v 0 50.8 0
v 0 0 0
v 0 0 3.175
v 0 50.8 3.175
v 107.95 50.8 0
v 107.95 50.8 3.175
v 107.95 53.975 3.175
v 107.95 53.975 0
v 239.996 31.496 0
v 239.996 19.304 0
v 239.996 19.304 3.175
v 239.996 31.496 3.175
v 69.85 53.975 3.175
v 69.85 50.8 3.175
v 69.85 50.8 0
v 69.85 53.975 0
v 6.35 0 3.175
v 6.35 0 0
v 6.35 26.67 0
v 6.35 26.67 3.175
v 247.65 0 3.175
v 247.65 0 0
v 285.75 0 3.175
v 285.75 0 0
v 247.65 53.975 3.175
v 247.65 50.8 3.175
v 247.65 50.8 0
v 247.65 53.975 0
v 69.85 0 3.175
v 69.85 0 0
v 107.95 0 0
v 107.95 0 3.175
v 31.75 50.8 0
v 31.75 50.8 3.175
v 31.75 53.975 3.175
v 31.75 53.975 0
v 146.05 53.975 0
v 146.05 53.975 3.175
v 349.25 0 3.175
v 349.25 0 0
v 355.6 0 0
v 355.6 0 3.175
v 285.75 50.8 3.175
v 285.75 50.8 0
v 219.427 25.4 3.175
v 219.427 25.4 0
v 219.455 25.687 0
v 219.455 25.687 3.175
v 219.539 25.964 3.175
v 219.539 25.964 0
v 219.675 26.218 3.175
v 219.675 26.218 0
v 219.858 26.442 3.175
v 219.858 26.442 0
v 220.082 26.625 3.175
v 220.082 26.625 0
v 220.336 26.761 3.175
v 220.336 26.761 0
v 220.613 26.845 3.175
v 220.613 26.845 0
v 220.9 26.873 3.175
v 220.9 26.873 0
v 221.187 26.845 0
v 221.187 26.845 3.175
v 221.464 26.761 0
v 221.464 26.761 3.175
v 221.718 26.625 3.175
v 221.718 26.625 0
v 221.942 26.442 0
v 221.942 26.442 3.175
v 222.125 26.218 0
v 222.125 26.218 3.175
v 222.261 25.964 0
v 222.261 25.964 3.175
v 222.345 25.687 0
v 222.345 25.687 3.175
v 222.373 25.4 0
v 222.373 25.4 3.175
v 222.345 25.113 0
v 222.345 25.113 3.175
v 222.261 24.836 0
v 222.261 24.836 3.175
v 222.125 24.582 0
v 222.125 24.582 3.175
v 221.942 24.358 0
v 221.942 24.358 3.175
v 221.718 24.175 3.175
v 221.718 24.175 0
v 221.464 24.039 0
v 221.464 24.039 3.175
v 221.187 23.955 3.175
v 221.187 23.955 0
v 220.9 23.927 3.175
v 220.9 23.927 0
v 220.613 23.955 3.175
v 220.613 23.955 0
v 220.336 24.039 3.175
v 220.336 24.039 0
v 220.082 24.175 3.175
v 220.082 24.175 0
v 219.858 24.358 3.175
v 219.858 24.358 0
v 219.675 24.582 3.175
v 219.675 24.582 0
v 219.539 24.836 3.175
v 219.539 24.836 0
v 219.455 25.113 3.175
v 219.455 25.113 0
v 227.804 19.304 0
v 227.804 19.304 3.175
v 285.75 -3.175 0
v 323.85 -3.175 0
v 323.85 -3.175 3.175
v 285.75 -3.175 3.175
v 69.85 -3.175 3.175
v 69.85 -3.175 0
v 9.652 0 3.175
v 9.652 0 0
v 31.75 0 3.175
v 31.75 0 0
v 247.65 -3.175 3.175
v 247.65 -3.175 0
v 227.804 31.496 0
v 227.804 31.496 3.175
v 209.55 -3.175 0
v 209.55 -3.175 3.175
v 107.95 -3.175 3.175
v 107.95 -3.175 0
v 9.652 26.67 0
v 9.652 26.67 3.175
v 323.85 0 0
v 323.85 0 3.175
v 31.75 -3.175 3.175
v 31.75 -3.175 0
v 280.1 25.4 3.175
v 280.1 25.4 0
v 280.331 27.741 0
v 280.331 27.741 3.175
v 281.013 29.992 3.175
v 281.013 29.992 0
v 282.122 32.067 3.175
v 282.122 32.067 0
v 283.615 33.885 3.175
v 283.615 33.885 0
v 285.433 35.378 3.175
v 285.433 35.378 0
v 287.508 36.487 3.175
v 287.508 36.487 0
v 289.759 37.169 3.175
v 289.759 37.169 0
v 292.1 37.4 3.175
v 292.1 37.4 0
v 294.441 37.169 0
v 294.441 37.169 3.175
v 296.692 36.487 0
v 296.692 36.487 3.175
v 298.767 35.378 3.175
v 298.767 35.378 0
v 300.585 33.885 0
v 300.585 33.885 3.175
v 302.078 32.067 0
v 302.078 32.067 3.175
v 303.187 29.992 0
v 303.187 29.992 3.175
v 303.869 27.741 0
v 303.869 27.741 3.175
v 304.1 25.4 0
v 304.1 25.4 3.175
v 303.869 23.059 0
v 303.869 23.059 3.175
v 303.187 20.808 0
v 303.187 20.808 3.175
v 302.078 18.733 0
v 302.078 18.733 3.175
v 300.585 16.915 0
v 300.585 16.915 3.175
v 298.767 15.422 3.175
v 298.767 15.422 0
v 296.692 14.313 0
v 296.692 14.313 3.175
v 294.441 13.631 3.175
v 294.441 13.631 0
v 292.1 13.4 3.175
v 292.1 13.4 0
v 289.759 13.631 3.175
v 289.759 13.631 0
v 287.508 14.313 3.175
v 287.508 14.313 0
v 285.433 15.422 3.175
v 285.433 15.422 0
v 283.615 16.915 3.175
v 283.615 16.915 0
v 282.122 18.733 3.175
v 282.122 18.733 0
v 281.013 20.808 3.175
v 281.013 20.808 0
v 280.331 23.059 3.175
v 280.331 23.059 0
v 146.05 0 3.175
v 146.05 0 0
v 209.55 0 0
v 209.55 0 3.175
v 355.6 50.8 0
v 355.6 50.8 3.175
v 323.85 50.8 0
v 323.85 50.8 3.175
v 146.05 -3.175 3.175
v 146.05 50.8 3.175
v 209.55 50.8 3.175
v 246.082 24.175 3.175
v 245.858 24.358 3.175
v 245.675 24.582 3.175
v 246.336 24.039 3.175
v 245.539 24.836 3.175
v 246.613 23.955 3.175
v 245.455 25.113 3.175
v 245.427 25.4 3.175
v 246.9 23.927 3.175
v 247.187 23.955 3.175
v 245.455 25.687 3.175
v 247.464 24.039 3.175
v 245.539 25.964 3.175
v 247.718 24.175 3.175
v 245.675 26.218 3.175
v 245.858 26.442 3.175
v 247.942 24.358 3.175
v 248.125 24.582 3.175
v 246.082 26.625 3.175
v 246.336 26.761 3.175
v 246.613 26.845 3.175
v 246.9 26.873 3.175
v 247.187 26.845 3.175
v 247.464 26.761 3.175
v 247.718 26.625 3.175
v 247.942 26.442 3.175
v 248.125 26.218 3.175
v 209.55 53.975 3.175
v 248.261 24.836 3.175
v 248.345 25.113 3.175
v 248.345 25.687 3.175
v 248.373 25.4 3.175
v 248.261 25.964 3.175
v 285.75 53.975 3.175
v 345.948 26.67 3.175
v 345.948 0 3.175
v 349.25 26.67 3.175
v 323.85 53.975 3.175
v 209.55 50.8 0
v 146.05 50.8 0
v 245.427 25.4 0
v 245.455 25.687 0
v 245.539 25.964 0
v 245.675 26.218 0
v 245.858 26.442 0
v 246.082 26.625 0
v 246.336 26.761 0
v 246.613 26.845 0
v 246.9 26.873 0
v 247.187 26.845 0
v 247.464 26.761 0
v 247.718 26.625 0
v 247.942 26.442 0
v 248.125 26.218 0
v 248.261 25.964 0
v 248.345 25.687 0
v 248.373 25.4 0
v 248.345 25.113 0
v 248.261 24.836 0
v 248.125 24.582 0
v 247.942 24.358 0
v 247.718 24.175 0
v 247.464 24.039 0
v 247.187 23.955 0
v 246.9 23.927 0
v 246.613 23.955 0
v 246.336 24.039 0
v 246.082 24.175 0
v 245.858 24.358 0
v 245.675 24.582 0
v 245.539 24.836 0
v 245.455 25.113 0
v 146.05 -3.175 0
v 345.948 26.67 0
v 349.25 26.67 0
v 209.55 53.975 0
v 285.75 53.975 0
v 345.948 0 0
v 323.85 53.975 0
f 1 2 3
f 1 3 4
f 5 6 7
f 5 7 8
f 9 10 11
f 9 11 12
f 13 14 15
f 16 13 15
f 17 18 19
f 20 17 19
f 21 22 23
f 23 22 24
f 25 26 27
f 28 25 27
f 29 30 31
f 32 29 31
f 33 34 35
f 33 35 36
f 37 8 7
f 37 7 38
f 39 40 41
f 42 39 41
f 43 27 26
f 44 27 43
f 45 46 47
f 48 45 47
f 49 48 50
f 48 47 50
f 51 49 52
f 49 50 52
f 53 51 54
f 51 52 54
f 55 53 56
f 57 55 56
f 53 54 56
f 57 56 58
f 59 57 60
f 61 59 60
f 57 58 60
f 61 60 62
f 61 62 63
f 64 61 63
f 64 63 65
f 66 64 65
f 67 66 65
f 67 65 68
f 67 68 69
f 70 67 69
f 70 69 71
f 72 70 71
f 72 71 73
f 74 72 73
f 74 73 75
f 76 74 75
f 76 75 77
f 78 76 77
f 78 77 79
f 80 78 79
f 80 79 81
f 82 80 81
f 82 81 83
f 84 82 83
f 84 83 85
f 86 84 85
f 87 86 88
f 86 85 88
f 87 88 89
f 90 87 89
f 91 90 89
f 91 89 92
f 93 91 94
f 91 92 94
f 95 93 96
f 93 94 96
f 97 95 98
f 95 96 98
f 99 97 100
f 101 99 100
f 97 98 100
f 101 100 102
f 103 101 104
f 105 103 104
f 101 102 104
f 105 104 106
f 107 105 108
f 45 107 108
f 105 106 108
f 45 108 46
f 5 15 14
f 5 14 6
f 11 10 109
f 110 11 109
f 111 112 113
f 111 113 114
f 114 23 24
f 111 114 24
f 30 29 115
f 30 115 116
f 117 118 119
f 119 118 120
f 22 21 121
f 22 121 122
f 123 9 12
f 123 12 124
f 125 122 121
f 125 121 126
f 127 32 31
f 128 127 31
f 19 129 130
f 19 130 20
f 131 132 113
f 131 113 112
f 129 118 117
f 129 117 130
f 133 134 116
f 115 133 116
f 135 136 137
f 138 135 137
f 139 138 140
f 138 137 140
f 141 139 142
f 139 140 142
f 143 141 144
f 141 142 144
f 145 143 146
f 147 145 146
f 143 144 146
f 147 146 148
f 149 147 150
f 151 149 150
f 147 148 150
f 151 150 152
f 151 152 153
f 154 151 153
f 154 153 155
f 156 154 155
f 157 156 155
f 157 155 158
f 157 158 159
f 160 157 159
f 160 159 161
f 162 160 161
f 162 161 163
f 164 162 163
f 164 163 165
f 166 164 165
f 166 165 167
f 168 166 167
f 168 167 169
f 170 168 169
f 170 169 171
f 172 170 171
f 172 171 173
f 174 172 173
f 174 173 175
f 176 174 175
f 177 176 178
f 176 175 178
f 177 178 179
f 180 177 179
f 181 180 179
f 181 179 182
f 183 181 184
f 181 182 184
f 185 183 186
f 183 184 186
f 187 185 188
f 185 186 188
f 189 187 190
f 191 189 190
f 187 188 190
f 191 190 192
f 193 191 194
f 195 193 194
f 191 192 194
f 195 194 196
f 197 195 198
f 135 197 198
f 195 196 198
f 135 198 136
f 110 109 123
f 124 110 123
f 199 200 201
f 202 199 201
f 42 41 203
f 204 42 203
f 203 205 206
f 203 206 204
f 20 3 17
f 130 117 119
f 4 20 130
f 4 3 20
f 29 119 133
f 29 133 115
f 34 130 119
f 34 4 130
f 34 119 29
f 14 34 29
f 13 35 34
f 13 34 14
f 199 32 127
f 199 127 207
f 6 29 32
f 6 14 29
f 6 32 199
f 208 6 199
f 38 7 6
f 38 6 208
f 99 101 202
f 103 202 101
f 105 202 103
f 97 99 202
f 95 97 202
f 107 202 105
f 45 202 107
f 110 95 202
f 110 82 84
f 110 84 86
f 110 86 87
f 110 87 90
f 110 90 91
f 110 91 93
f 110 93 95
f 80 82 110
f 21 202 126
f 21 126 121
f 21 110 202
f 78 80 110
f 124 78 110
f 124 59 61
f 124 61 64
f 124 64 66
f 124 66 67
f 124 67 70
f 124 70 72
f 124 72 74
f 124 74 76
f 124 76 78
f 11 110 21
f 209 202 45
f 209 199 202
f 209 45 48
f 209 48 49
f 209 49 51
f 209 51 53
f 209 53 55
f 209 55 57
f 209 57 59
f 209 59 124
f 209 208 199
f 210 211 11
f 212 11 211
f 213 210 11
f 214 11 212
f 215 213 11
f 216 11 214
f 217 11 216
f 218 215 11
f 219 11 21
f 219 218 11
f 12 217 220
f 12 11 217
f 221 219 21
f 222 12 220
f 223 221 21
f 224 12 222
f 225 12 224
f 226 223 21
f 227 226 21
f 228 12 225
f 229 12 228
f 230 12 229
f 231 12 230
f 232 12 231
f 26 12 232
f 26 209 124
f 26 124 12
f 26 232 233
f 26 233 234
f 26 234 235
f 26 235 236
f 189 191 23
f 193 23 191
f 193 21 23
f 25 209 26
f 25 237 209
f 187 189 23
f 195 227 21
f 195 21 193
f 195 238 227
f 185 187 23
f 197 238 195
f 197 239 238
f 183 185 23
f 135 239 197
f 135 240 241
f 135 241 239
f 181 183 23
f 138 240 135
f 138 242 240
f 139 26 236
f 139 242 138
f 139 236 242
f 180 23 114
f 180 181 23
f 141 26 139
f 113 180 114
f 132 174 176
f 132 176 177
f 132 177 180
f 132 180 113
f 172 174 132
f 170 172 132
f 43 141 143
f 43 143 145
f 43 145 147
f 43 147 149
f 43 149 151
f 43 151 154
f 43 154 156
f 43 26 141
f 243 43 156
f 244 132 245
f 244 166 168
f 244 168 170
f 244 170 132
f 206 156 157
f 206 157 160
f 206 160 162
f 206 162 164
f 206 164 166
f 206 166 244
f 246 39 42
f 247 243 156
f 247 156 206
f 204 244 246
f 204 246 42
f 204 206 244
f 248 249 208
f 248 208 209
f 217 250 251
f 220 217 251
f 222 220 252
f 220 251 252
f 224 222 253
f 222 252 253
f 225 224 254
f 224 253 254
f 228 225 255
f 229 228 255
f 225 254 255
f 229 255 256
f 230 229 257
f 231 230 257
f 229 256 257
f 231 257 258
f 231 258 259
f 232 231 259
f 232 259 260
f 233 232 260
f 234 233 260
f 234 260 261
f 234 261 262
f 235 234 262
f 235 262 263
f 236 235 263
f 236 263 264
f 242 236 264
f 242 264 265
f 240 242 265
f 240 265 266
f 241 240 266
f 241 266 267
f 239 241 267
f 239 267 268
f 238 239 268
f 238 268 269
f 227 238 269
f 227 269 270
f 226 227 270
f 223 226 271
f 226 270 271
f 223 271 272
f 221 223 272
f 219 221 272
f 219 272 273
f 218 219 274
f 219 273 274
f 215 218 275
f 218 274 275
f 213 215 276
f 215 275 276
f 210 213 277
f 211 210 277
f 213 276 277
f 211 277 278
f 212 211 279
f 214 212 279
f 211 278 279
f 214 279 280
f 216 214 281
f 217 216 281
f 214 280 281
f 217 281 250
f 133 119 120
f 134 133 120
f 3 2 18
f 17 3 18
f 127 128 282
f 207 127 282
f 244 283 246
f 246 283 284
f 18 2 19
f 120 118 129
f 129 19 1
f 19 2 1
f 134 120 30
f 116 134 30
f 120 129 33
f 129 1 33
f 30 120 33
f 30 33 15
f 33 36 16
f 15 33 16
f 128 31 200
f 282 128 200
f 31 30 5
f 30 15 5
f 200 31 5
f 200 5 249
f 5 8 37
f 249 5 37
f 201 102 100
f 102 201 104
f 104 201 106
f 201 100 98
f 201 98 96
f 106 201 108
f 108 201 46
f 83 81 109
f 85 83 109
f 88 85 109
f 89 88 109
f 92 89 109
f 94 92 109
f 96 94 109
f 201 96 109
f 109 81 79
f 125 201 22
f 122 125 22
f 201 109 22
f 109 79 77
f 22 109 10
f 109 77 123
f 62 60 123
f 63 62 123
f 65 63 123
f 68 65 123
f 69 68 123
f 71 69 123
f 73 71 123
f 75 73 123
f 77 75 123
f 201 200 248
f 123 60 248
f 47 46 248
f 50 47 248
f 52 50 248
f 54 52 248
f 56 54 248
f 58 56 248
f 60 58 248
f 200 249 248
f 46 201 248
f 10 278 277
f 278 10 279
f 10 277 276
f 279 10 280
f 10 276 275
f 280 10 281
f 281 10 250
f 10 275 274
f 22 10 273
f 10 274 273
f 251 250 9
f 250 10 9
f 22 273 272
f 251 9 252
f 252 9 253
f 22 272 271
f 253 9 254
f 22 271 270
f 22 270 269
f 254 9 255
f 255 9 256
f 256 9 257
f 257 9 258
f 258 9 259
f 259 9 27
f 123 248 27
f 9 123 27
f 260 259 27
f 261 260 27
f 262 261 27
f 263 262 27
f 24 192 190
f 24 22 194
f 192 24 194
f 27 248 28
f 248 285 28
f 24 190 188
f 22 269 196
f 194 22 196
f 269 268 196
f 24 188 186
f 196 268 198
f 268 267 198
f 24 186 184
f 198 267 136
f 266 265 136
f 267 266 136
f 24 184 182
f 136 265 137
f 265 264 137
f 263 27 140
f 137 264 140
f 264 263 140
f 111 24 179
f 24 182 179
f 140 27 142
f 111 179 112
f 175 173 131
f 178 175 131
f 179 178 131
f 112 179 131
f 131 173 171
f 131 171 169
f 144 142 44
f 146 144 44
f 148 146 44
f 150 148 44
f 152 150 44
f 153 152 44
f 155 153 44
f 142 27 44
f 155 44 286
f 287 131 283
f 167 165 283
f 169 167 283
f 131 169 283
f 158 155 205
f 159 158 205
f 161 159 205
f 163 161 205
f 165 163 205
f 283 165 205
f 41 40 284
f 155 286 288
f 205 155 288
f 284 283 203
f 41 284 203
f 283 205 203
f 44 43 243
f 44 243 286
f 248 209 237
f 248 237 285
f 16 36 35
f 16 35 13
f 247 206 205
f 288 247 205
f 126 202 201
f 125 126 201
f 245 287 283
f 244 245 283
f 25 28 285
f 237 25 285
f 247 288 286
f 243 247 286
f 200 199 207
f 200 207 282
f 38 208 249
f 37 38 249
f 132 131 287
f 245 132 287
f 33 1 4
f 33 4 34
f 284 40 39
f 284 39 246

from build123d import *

# Parameters (mm, degrees)
SKETCH1_W               = 355.6
SKETCH1_H               = 50.8
BOSS_EXTRUDE1_DEPTH     = 3.175
SKETCH2_W               = 38.1
SKETCH2_H               = 3.175
BOSS_EXTRUDE2_DEPTH     = 3.175
MIRROR2_COPY_1_SKETCH_W = 38.1
MIRROR2_COPY_1_SKETCH_H = 3.175
MIRROR2_COPY_1_DEPTH    = 3.175
SKETCH3_W               = 3.302
SKETCH3_H               = 26.67
CUT_EXTRUDE1_DEPTH      = 3.175
SKETCH4_R               = 1.4732
SKETCH4_R_2             = 12
SKETCH4_W               = 12.192
SKETCH4_H               = 12.192
CUT_EXTRUDE2_DEPTH      = 1
CUT_EXTRUDE2_DEPTH_BACK = 4.175


with BuildPart() as part:
    # Sketch1 → Boss-Extrude1 (new body)
    with BuildSketch(Plane.XY):
        with Locations((177.8, 25.4)):
            Rectangle(SKETCH1_W, SKETCH1_H)
    extrude(amount=BOSS_EXTRUDE1_DEPTH)

    # Sketch2 → Boss-Extrude2 (add)
    with BuildSketch(Plane(origin=(0, 50.8, 0), x_dir=(1, 0, 0), z_dir=(0, 1, 0))):
        with Locations((50.8, -1.5875)):
            Rectangle(SKETCH2_W, SKETCH2_H)
        with Locations((127, -1.5875)):
            Rectangle(SKETCH2_W, SKETCH2_H)
    boss_extrude2 = extrude(amount=BOSS_EXTRUDE2_DEPTH)

    # Mirror1: Boss-Extrude2 across plane
    add(boss_extrude2.mirror(Plane.ZY.offset(-177.8)))

    # Mirror2: Boss-Extrude2 across plane
    add(boss_extrude2.mirror(Plane.ZX.offset(25.4)))

    # Mirror2 copy 1 sketch → Mirror2 copy 1 (add)
    with BuildSketch(Plane(origin=(355.6, 0, 0), x_dir=(-1, 0, 0), z_dir=(0, -1, 0))):
        with Locations((50.8, -1.5875)):
            Rectangle(MIRROR2_COPY_1_SKETCH_W, MIRROR2_COPY_1_SKETCH_H)
        with Locations((127, -1.5875)):
            Rectangle(MIRROR2_COPY_1_SKETCH_W, MIRROR2_COPY_1_SKETCH_H)
    extrude(amount=MIRROR2_COPY_1_DEPTH)

    # Sketch3 → Cut-Extrude1 (cut)
    with BuildSketch(Plane(origin=(0, 0, 0), x_dir=(-1, 0, 0), z_dir=(0, 0, -1))):
        with Locations((-8.001, 13.335)):
            Rectangle(SKETCH3_W, SKETCH3_H)
    cut_extrude1 = extrude(amount=-CUT_EXTRUDE1_DEPTH, mode=Mode.SUBTRACT)

    # Mirror3: Cut-Extrude1 across plane
    add(cut_extrude1.mirror(Plane.ZY.offset(-177.8)), mode=Mode.SUBTRACT)

    # Sketch4 → Cut-Extrude2 (cut, two sides)
    with BuildSketch(Plane(origin=(0, 0, 0), x_dir=(-1, 0, 0), z_dir=(0, 0, -1))) as cut_extrude2_sk:
        with Locations((-220.9, 25.4)):
            Circle(SKETCH4_R)
        with Locations((-246.9, 25.4)):
            Circle(SKETCH4_R)
        with Locations((-292.1, 25.4)):
            Circle(SKETCH4_R_2)
        with Locations((-233.9, 25.4)):
            Rectangle(SKETCH4_W, SKETCH4_H)
    extrude(amount=CUT_EXTRUDE2_DEPTH, mode=Mode.SUBTRACT)
    extrude(cut_extrude2_sk.sketch, amount=-CUT_EXTRUDE2_DEPTH_BACK, mode=Mode.SUBTRACT)


solid = part.part
